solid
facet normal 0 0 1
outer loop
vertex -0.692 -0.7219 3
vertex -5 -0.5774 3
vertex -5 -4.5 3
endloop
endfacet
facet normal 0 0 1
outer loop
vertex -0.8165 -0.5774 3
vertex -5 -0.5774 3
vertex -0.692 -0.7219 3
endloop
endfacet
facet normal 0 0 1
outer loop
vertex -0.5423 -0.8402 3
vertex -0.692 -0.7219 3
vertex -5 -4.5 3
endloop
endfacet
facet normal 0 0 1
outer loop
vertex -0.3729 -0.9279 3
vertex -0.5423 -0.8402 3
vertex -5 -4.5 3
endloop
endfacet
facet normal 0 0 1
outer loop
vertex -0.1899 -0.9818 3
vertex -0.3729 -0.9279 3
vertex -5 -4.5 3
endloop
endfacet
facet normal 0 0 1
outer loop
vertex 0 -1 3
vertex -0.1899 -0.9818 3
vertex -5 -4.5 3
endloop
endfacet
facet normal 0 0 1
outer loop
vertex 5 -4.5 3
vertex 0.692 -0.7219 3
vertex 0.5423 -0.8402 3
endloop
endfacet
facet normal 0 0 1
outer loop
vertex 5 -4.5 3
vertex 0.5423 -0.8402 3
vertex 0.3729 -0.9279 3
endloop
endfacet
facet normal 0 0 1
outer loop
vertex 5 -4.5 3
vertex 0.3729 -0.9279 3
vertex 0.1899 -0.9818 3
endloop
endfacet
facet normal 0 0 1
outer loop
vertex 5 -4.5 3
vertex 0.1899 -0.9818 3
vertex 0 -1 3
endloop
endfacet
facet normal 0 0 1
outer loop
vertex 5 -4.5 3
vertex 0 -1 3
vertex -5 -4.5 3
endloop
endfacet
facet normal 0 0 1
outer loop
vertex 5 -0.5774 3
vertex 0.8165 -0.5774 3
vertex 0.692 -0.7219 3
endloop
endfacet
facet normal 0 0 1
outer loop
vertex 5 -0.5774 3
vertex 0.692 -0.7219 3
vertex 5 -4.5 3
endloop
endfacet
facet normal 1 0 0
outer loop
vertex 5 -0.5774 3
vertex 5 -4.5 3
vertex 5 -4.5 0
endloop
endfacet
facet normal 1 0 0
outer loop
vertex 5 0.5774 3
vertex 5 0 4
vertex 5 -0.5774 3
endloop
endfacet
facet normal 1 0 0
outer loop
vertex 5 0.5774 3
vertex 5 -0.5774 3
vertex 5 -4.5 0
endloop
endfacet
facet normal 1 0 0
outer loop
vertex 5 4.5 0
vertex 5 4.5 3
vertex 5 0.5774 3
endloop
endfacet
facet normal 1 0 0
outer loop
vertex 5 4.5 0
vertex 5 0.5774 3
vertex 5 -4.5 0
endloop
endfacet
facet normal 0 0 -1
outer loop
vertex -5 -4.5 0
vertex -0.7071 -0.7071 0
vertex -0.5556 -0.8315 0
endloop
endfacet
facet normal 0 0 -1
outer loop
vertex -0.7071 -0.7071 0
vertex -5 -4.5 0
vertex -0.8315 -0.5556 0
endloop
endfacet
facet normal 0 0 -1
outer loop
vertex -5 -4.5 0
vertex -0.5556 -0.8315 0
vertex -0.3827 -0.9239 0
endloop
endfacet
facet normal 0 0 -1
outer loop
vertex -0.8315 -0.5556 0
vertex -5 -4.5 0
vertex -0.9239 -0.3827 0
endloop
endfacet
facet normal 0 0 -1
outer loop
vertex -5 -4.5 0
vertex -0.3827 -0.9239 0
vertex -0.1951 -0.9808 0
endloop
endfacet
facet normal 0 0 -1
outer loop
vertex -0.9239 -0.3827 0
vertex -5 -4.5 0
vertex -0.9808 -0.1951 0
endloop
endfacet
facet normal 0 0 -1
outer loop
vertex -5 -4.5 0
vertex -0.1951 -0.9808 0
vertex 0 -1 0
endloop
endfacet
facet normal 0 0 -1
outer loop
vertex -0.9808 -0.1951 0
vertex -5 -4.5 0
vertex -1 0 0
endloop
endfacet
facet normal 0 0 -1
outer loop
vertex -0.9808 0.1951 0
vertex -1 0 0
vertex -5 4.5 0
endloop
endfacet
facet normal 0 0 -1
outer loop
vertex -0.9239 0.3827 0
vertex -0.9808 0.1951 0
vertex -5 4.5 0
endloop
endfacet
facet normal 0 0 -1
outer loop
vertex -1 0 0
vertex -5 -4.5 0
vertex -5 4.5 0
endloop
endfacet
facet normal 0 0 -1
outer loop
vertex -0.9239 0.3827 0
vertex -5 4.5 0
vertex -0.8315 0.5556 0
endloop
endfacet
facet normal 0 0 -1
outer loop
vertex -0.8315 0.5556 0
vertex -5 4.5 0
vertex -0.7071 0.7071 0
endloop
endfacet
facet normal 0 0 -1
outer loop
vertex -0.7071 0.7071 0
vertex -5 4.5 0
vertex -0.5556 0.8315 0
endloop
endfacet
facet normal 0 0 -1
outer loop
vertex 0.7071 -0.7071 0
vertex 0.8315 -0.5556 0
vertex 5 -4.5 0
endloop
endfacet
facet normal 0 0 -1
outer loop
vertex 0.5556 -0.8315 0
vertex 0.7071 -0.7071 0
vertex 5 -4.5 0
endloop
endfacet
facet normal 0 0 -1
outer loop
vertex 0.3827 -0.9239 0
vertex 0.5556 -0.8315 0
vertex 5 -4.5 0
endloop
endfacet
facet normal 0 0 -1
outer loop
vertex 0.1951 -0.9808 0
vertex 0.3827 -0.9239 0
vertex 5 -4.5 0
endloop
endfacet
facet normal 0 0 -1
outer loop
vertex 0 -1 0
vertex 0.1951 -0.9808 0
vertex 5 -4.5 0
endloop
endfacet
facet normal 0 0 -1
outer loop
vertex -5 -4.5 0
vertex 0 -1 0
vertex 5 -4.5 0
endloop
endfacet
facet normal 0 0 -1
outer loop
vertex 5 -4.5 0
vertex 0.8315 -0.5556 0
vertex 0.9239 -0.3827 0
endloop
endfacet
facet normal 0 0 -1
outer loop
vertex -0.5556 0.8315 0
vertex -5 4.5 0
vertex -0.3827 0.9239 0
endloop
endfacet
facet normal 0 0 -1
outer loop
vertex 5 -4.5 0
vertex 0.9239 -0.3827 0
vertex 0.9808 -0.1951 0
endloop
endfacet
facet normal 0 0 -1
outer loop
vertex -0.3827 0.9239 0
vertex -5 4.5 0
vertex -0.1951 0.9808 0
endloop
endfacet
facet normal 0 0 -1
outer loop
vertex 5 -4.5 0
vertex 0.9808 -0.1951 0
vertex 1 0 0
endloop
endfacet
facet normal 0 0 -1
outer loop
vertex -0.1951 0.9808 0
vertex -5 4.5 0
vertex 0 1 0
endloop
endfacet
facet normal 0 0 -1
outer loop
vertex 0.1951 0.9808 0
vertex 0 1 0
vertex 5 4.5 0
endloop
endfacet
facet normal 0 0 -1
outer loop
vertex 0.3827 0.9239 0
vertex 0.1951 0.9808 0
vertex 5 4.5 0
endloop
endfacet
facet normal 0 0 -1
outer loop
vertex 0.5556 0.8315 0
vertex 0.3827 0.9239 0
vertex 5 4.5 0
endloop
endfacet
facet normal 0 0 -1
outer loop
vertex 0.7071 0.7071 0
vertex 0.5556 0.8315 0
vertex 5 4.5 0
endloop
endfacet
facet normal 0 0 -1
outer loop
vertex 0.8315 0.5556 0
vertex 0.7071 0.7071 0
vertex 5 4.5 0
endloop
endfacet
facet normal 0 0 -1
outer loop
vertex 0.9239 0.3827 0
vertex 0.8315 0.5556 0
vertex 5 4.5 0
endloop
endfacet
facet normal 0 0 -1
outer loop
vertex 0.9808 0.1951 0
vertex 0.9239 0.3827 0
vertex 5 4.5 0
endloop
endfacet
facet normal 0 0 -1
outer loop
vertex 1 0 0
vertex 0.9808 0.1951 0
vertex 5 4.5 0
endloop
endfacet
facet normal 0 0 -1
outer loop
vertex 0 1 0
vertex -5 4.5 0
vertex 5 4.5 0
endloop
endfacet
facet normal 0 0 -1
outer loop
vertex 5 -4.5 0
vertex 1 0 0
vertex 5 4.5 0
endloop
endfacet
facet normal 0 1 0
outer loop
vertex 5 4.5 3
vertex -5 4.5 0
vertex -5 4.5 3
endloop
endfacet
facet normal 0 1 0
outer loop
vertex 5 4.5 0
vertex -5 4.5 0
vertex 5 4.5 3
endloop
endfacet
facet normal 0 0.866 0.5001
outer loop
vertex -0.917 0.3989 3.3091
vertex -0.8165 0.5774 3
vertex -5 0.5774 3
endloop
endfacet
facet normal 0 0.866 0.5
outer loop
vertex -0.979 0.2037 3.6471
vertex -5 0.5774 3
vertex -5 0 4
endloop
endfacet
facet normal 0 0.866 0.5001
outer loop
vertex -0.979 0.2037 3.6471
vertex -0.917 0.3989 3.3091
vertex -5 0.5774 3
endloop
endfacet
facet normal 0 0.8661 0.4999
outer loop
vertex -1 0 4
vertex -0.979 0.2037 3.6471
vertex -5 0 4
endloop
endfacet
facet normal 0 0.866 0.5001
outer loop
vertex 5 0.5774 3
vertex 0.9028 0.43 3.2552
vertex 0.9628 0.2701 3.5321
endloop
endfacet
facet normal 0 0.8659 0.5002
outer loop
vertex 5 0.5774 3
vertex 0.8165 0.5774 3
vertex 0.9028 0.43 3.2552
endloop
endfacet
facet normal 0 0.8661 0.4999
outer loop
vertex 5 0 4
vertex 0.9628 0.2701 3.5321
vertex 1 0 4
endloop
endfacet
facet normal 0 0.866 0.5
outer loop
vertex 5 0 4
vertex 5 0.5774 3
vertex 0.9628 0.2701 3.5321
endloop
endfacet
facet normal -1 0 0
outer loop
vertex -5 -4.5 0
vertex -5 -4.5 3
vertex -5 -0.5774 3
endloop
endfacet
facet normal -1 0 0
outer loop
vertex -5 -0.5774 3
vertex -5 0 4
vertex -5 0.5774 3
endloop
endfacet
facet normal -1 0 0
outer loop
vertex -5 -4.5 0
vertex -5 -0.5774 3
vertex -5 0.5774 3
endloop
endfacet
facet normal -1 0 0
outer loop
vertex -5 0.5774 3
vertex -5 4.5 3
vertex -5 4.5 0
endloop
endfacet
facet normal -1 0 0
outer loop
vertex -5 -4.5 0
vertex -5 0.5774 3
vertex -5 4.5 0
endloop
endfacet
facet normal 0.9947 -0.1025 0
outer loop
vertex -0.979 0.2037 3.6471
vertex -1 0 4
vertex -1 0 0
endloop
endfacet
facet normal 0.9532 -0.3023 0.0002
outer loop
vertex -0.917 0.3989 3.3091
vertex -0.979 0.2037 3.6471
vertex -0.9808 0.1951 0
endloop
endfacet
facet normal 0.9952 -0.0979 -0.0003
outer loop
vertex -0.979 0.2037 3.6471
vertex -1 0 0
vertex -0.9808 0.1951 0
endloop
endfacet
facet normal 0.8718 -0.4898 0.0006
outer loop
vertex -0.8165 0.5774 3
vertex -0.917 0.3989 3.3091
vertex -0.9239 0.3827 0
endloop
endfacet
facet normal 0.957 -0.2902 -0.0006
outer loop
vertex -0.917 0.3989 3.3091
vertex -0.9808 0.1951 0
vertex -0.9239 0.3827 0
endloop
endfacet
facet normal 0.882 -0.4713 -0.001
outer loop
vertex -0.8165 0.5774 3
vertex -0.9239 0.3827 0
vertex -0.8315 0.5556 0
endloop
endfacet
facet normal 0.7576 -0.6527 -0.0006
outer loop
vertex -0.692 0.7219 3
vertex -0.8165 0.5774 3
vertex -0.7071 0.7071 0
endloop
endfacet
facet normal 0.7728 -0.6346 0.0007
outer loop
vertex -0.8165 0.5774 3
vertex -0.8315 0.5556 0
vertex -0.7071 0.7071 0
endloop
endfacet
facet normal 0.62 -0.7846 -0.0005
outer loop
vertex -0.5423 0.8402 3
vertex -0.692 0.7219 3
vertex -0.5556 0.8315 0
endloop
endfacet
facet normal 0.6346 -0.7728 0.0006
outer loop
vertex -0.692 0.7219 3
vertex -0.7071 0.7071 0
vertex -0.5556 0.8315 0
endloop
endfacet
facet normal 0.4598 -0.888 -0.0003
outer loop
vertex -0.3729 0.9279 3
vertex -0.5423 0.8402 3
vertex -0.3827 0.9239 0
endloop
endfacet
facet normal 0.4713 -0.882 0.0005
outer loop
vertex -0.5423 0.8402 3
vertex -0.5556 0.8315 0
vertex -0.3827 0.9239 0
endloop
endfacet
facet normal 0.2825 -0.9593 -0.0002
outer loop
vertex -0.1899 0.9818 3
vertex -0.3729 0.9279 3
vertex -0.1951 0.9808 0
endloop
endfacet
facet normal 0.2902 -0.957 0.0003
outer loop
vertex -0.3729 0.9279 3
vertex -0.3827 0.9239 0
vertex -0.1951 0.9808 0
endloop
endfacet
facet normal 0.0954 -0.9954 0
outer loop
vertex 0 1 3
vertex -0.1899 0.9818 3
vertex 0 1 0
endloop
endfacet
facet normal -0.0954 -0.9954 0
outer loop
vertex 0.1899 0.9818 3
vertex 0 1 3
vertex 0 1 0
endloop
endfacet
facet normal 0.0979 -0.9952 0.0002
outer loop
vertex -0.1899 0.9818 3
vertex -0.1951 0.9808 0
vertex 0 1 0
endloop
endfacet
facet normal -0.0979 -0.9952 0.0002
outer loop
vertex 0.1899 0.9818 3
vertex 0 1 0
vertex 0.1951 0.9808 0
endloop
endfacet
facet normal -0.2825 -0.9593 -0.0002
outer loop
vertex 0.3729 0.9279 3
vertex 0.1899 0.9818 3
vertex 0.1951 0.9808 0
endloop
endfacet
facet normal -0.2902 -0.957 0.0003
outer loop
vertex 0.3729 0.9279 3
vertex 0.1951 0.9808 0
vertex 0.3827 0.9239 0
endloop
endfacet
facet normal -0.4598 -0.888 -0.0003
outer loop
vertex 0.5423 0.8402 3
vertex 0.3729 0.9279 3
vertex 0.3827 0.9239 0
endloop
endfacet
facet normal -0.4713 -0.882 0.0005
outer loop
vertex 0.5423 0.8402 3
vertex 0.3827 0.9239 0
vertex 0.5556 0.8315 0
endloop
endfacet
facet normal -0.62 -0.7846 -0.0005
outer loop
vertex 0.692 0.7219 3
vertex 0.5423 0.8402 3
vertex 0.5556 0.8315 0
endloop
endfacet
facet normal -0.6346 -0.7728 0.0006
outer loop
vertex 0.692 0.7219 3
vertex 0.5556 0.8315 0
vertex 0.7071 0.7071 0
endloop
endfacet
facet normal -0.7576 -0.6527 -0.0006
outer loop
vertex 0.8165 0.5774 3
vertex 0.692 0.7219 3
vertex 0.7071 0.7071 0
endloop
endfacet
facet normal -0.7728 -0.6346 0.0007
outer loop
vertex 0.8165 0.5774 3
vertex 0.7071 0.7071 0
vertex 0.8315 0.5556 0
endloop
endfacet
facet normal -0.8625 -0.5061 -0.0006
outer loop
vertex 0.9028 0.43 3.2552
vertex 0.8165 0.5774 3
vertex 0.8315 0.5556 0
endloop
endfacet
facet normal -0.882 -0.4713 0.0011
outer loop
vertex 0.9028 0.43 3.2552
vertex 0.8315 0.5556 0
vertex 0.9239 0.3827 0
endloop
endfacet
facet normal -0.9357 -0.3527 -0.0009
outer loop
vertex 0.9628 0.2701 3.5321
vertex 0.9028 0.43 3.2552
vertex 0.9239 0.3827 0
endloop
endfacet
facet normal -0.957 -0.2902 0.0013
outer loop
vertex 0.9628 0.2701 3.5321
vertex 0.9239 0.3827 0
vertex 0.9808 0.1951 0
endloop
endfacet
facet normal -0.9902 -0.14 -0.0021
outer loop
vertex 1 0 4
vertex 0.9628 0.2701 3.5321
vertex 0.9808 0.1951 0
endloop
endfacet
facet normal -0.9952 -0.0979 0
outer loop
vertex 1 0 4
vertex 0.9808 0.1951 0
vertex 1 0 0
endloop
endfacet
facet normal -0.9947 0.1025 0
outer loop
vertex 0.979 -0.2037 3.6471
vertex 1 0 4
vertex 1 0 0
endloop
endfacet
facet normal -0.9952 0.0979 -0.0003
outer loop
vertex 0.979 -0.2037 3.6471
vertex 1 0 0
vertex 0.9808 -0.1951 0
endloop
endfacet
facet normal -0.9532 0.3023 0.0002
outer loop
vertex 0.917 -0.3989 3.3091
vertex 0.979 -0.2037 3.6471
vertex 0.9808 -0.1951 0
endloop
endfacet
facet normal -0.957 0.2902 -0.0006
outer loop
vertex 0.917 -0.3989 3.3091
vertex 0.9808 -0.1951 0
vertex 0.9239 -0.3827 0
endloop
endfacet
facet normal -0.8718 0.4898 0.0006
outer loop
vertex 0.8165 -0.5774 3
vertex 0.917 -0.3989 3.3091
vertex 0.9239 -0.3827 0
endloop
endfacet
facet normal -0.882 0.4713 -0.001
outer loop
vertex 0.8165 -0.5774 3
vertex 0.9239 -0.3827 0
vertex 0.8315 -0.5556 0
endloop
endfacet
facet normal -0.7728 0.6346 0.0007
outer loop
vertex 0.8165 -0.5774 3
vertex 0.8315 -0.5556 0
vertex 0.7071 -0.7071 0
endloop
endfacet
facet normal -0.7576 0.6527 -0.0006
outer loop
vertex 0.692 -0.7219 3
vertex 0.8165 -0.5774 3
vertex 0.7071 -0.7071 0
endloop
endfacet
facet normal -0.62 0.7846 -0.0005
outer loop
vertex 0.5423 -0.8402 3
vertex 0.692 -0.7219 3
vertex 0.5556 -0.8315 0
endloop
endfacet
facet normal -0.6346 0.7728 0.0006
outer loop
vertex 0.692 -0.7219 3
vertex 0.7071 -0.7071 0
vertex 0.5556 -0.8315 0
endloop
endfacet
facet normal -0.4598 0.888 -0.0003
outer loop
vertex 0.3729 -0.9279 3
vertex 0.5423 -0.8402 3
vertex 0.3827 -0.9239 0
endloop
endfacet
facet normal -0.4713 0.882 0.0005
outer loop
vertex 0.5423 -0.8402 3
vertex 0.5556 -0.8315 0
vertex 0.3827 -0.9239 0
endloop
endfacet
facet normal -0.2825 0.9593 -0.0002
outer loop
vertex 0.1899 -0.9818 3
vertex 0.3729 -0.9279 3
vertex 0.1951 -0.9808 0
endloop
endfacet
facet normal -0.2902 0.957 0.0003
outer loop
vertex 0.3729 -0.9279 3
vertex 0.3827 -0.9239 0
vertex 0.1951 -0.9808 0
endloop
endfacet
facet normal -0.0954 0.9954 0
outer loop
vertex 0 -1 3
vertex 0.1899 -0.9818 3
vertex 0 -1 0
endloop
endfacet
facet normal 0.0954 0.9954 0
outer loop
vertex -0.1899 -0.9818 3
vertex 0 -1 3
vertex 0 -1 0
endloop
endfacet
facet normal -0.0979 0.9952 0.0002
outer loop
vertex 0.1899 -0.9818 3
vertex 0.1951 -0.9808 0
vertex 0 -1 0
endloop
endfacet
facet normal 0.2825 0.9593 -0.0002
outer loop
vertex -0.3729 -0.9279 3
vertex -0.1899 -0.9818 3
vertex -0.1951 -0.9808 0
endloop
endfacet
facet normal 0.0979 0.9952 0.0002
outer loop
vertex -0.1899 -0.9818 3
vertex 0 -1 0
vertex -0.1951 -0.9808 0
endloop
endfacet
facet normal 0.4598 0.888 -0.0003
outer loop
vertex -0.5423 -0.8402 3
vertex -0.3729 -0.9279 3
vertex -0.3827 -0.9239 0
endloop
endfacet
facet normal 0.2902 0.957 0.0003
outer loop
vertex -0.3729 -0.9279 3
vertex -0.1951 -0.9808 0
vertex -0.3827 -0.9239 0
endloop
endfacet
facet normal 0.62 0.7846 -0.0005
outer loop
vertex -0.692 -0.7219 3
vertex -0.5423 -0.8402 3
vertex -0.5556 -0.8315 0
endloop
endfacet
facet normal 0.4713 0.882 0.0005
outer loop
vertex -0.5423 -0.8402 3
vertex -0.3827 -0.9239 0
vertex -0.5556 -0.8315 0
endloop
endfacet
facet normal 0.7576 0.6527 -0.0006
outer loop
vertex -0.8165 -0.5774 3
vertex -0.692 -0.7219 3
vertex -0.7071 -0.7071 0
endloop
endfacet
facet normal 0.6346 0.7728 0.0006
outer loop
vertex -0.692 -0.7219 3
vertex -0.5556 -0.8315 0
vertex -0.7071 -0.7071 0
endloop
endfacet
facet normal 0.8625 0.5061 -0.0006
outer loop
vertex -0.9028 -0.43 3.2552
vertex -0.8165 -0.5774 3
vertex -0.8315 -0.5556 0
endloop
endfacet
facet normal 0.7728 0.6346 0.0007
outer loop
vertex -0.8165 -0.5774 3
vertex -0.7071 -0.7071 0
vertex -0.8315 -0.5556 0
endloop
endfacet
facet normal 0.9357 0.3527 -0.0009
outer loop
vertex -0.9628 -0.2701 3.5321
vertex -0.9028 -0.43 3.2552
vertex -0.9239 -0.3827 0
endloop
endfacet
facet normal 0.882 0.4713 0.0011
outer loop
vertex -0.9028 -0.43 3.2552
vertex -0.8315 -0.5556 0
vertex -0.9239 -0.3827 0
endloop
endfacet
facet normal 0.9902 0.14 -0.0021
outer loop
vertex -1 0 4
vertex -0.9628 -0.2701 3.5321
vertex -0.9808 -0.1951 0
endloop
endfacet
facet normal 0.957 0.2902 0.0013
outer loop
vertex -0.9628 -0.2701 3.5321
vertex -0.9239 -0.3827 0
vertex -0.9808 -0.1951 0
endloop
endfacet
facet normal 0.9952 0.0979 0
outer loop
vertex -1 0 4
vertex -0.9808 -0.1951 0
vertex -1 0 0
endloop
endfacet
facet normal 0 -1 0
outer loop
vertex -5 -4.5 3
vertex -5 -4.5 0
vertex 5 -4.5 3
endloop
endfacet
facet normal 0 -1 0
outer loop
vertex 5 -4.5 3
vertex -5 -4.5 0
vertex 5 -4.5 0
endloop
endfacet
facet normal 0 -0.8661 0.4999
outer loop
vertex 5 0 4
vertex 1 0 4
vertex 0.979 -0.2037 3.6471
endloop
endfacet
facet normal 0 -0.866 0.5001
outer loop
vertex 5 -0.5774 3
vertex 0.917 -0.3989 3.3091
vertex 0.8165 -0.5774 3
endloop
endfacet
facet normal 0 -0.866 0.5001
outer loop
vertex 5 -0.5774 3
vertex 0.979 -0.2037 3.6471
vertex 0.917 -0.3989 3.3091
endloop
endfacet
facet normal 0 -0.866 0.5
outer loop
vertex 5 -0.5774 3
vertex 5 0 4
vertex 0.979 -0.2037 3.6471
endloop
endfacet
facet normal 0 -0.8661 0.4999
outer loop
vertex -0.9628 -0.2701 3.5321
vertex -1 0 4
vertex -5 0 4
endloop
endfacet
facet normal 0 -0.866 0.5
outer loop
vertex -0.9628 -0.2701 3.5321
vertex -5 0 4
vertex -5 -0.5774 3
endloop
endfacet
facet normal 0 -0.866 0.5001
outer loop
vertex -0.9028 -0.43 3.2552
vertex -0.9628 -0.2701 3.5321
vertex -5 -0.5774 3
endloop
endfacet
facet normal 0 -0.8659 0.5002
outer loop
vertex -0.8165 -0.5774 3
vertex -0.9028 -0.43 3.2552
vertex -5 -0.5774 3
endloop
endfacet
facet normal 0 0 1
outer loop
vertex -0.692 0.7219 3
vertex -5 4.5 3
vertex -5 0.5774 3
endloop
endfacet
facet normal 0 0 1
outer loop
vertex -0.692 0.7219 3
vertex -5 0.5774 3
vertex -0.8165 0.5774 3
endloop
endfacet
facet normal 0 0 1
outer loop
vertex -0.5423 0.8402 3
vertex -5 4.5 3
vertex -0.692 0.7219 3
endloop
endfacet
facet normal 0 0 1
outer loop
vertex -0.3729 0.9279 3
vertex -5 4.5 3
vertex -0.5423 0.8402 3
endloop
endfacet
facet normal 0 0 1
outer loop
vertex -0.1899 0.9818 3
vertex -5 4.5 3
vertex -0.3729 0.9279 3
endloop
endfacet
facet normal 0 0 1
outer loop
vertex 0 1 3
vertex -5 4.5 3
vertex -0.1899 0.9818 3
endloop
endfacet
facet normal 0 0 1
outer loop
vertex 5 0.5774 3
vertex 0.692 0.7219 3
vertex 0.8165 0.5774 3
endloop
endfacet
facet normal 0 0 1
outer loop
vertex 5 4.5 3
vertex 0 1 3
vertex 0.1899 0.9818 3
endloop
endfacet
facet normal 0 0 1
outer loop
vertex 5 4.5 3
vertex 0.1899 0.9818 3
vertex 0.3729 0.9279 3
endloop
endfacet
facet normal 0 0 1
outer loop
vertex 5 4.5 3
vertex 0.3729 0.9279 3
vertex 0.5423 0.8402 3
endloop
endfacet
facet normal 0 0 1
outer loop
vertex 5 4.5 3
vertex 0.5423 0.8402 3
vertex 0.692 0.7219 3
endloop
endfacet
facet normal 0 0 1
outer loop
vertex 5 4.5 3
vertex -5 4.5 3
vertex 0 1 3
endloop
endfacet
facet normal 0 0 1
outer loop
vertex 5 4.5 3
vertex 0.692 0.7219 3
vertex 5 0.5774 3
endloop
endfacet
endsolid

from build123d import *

# Parameters (mm, degrees)
SKETCH1_W           = 10
SKETCH1_H           = 9
BOSS_EXTRUDE1_DEPTH = 3
BOSS_EXTRUDE2_DEPTH = 10
CUT_EXTRUDE1_REACH  = 9.826
SKETCH3_R           = 1


with BuildPart() as part:
    # Sketch1 → Boss-Extrude1 (new body)
    with BuildSketch(Plane.XY):
        Rectangle(SKETCH1_W, SKETCH1_H)
    extrude(amount=BOSS_EXTRUDE1_DEPTH)

    # Sketch2 → Boss-Extrude2 (add)
    with BuildSketch(Plane(origin=(5, 0, 0), x_dir=(0, 0, -1), z_dir=(1, 0, 0))):
        Polygon((-4, 0), (-2.5, -0.866025404), (-2.5, 0.866025404), align=None)
    extrude(amount=-BOSS_EXTRUDE2_DEPTH)

    # Sketch3 → Cut-Extrude1 (cut, up to next)
    with BuildSketch(Plane(origin=(0, 0, 0), x_dir=(-1, 0, 0), z_dir=(0, 0, -1)), mode=Mode.PRIVATE) as cut_extrude1_sk1:
        Circle(SKETCH3_R)
    cut_extrude1_tool1 = extrude(cut_extrude1_sk1.sketch, amount=-CUT_EXTRUDE1_REACH, mode=Mode.PRIVATE) & part.part
    add(cut_extrude1_tool1.solids().sort_by_distance((0, 0, 0))[0], mode=Mode.SUBTRACT)


solid = part.part
